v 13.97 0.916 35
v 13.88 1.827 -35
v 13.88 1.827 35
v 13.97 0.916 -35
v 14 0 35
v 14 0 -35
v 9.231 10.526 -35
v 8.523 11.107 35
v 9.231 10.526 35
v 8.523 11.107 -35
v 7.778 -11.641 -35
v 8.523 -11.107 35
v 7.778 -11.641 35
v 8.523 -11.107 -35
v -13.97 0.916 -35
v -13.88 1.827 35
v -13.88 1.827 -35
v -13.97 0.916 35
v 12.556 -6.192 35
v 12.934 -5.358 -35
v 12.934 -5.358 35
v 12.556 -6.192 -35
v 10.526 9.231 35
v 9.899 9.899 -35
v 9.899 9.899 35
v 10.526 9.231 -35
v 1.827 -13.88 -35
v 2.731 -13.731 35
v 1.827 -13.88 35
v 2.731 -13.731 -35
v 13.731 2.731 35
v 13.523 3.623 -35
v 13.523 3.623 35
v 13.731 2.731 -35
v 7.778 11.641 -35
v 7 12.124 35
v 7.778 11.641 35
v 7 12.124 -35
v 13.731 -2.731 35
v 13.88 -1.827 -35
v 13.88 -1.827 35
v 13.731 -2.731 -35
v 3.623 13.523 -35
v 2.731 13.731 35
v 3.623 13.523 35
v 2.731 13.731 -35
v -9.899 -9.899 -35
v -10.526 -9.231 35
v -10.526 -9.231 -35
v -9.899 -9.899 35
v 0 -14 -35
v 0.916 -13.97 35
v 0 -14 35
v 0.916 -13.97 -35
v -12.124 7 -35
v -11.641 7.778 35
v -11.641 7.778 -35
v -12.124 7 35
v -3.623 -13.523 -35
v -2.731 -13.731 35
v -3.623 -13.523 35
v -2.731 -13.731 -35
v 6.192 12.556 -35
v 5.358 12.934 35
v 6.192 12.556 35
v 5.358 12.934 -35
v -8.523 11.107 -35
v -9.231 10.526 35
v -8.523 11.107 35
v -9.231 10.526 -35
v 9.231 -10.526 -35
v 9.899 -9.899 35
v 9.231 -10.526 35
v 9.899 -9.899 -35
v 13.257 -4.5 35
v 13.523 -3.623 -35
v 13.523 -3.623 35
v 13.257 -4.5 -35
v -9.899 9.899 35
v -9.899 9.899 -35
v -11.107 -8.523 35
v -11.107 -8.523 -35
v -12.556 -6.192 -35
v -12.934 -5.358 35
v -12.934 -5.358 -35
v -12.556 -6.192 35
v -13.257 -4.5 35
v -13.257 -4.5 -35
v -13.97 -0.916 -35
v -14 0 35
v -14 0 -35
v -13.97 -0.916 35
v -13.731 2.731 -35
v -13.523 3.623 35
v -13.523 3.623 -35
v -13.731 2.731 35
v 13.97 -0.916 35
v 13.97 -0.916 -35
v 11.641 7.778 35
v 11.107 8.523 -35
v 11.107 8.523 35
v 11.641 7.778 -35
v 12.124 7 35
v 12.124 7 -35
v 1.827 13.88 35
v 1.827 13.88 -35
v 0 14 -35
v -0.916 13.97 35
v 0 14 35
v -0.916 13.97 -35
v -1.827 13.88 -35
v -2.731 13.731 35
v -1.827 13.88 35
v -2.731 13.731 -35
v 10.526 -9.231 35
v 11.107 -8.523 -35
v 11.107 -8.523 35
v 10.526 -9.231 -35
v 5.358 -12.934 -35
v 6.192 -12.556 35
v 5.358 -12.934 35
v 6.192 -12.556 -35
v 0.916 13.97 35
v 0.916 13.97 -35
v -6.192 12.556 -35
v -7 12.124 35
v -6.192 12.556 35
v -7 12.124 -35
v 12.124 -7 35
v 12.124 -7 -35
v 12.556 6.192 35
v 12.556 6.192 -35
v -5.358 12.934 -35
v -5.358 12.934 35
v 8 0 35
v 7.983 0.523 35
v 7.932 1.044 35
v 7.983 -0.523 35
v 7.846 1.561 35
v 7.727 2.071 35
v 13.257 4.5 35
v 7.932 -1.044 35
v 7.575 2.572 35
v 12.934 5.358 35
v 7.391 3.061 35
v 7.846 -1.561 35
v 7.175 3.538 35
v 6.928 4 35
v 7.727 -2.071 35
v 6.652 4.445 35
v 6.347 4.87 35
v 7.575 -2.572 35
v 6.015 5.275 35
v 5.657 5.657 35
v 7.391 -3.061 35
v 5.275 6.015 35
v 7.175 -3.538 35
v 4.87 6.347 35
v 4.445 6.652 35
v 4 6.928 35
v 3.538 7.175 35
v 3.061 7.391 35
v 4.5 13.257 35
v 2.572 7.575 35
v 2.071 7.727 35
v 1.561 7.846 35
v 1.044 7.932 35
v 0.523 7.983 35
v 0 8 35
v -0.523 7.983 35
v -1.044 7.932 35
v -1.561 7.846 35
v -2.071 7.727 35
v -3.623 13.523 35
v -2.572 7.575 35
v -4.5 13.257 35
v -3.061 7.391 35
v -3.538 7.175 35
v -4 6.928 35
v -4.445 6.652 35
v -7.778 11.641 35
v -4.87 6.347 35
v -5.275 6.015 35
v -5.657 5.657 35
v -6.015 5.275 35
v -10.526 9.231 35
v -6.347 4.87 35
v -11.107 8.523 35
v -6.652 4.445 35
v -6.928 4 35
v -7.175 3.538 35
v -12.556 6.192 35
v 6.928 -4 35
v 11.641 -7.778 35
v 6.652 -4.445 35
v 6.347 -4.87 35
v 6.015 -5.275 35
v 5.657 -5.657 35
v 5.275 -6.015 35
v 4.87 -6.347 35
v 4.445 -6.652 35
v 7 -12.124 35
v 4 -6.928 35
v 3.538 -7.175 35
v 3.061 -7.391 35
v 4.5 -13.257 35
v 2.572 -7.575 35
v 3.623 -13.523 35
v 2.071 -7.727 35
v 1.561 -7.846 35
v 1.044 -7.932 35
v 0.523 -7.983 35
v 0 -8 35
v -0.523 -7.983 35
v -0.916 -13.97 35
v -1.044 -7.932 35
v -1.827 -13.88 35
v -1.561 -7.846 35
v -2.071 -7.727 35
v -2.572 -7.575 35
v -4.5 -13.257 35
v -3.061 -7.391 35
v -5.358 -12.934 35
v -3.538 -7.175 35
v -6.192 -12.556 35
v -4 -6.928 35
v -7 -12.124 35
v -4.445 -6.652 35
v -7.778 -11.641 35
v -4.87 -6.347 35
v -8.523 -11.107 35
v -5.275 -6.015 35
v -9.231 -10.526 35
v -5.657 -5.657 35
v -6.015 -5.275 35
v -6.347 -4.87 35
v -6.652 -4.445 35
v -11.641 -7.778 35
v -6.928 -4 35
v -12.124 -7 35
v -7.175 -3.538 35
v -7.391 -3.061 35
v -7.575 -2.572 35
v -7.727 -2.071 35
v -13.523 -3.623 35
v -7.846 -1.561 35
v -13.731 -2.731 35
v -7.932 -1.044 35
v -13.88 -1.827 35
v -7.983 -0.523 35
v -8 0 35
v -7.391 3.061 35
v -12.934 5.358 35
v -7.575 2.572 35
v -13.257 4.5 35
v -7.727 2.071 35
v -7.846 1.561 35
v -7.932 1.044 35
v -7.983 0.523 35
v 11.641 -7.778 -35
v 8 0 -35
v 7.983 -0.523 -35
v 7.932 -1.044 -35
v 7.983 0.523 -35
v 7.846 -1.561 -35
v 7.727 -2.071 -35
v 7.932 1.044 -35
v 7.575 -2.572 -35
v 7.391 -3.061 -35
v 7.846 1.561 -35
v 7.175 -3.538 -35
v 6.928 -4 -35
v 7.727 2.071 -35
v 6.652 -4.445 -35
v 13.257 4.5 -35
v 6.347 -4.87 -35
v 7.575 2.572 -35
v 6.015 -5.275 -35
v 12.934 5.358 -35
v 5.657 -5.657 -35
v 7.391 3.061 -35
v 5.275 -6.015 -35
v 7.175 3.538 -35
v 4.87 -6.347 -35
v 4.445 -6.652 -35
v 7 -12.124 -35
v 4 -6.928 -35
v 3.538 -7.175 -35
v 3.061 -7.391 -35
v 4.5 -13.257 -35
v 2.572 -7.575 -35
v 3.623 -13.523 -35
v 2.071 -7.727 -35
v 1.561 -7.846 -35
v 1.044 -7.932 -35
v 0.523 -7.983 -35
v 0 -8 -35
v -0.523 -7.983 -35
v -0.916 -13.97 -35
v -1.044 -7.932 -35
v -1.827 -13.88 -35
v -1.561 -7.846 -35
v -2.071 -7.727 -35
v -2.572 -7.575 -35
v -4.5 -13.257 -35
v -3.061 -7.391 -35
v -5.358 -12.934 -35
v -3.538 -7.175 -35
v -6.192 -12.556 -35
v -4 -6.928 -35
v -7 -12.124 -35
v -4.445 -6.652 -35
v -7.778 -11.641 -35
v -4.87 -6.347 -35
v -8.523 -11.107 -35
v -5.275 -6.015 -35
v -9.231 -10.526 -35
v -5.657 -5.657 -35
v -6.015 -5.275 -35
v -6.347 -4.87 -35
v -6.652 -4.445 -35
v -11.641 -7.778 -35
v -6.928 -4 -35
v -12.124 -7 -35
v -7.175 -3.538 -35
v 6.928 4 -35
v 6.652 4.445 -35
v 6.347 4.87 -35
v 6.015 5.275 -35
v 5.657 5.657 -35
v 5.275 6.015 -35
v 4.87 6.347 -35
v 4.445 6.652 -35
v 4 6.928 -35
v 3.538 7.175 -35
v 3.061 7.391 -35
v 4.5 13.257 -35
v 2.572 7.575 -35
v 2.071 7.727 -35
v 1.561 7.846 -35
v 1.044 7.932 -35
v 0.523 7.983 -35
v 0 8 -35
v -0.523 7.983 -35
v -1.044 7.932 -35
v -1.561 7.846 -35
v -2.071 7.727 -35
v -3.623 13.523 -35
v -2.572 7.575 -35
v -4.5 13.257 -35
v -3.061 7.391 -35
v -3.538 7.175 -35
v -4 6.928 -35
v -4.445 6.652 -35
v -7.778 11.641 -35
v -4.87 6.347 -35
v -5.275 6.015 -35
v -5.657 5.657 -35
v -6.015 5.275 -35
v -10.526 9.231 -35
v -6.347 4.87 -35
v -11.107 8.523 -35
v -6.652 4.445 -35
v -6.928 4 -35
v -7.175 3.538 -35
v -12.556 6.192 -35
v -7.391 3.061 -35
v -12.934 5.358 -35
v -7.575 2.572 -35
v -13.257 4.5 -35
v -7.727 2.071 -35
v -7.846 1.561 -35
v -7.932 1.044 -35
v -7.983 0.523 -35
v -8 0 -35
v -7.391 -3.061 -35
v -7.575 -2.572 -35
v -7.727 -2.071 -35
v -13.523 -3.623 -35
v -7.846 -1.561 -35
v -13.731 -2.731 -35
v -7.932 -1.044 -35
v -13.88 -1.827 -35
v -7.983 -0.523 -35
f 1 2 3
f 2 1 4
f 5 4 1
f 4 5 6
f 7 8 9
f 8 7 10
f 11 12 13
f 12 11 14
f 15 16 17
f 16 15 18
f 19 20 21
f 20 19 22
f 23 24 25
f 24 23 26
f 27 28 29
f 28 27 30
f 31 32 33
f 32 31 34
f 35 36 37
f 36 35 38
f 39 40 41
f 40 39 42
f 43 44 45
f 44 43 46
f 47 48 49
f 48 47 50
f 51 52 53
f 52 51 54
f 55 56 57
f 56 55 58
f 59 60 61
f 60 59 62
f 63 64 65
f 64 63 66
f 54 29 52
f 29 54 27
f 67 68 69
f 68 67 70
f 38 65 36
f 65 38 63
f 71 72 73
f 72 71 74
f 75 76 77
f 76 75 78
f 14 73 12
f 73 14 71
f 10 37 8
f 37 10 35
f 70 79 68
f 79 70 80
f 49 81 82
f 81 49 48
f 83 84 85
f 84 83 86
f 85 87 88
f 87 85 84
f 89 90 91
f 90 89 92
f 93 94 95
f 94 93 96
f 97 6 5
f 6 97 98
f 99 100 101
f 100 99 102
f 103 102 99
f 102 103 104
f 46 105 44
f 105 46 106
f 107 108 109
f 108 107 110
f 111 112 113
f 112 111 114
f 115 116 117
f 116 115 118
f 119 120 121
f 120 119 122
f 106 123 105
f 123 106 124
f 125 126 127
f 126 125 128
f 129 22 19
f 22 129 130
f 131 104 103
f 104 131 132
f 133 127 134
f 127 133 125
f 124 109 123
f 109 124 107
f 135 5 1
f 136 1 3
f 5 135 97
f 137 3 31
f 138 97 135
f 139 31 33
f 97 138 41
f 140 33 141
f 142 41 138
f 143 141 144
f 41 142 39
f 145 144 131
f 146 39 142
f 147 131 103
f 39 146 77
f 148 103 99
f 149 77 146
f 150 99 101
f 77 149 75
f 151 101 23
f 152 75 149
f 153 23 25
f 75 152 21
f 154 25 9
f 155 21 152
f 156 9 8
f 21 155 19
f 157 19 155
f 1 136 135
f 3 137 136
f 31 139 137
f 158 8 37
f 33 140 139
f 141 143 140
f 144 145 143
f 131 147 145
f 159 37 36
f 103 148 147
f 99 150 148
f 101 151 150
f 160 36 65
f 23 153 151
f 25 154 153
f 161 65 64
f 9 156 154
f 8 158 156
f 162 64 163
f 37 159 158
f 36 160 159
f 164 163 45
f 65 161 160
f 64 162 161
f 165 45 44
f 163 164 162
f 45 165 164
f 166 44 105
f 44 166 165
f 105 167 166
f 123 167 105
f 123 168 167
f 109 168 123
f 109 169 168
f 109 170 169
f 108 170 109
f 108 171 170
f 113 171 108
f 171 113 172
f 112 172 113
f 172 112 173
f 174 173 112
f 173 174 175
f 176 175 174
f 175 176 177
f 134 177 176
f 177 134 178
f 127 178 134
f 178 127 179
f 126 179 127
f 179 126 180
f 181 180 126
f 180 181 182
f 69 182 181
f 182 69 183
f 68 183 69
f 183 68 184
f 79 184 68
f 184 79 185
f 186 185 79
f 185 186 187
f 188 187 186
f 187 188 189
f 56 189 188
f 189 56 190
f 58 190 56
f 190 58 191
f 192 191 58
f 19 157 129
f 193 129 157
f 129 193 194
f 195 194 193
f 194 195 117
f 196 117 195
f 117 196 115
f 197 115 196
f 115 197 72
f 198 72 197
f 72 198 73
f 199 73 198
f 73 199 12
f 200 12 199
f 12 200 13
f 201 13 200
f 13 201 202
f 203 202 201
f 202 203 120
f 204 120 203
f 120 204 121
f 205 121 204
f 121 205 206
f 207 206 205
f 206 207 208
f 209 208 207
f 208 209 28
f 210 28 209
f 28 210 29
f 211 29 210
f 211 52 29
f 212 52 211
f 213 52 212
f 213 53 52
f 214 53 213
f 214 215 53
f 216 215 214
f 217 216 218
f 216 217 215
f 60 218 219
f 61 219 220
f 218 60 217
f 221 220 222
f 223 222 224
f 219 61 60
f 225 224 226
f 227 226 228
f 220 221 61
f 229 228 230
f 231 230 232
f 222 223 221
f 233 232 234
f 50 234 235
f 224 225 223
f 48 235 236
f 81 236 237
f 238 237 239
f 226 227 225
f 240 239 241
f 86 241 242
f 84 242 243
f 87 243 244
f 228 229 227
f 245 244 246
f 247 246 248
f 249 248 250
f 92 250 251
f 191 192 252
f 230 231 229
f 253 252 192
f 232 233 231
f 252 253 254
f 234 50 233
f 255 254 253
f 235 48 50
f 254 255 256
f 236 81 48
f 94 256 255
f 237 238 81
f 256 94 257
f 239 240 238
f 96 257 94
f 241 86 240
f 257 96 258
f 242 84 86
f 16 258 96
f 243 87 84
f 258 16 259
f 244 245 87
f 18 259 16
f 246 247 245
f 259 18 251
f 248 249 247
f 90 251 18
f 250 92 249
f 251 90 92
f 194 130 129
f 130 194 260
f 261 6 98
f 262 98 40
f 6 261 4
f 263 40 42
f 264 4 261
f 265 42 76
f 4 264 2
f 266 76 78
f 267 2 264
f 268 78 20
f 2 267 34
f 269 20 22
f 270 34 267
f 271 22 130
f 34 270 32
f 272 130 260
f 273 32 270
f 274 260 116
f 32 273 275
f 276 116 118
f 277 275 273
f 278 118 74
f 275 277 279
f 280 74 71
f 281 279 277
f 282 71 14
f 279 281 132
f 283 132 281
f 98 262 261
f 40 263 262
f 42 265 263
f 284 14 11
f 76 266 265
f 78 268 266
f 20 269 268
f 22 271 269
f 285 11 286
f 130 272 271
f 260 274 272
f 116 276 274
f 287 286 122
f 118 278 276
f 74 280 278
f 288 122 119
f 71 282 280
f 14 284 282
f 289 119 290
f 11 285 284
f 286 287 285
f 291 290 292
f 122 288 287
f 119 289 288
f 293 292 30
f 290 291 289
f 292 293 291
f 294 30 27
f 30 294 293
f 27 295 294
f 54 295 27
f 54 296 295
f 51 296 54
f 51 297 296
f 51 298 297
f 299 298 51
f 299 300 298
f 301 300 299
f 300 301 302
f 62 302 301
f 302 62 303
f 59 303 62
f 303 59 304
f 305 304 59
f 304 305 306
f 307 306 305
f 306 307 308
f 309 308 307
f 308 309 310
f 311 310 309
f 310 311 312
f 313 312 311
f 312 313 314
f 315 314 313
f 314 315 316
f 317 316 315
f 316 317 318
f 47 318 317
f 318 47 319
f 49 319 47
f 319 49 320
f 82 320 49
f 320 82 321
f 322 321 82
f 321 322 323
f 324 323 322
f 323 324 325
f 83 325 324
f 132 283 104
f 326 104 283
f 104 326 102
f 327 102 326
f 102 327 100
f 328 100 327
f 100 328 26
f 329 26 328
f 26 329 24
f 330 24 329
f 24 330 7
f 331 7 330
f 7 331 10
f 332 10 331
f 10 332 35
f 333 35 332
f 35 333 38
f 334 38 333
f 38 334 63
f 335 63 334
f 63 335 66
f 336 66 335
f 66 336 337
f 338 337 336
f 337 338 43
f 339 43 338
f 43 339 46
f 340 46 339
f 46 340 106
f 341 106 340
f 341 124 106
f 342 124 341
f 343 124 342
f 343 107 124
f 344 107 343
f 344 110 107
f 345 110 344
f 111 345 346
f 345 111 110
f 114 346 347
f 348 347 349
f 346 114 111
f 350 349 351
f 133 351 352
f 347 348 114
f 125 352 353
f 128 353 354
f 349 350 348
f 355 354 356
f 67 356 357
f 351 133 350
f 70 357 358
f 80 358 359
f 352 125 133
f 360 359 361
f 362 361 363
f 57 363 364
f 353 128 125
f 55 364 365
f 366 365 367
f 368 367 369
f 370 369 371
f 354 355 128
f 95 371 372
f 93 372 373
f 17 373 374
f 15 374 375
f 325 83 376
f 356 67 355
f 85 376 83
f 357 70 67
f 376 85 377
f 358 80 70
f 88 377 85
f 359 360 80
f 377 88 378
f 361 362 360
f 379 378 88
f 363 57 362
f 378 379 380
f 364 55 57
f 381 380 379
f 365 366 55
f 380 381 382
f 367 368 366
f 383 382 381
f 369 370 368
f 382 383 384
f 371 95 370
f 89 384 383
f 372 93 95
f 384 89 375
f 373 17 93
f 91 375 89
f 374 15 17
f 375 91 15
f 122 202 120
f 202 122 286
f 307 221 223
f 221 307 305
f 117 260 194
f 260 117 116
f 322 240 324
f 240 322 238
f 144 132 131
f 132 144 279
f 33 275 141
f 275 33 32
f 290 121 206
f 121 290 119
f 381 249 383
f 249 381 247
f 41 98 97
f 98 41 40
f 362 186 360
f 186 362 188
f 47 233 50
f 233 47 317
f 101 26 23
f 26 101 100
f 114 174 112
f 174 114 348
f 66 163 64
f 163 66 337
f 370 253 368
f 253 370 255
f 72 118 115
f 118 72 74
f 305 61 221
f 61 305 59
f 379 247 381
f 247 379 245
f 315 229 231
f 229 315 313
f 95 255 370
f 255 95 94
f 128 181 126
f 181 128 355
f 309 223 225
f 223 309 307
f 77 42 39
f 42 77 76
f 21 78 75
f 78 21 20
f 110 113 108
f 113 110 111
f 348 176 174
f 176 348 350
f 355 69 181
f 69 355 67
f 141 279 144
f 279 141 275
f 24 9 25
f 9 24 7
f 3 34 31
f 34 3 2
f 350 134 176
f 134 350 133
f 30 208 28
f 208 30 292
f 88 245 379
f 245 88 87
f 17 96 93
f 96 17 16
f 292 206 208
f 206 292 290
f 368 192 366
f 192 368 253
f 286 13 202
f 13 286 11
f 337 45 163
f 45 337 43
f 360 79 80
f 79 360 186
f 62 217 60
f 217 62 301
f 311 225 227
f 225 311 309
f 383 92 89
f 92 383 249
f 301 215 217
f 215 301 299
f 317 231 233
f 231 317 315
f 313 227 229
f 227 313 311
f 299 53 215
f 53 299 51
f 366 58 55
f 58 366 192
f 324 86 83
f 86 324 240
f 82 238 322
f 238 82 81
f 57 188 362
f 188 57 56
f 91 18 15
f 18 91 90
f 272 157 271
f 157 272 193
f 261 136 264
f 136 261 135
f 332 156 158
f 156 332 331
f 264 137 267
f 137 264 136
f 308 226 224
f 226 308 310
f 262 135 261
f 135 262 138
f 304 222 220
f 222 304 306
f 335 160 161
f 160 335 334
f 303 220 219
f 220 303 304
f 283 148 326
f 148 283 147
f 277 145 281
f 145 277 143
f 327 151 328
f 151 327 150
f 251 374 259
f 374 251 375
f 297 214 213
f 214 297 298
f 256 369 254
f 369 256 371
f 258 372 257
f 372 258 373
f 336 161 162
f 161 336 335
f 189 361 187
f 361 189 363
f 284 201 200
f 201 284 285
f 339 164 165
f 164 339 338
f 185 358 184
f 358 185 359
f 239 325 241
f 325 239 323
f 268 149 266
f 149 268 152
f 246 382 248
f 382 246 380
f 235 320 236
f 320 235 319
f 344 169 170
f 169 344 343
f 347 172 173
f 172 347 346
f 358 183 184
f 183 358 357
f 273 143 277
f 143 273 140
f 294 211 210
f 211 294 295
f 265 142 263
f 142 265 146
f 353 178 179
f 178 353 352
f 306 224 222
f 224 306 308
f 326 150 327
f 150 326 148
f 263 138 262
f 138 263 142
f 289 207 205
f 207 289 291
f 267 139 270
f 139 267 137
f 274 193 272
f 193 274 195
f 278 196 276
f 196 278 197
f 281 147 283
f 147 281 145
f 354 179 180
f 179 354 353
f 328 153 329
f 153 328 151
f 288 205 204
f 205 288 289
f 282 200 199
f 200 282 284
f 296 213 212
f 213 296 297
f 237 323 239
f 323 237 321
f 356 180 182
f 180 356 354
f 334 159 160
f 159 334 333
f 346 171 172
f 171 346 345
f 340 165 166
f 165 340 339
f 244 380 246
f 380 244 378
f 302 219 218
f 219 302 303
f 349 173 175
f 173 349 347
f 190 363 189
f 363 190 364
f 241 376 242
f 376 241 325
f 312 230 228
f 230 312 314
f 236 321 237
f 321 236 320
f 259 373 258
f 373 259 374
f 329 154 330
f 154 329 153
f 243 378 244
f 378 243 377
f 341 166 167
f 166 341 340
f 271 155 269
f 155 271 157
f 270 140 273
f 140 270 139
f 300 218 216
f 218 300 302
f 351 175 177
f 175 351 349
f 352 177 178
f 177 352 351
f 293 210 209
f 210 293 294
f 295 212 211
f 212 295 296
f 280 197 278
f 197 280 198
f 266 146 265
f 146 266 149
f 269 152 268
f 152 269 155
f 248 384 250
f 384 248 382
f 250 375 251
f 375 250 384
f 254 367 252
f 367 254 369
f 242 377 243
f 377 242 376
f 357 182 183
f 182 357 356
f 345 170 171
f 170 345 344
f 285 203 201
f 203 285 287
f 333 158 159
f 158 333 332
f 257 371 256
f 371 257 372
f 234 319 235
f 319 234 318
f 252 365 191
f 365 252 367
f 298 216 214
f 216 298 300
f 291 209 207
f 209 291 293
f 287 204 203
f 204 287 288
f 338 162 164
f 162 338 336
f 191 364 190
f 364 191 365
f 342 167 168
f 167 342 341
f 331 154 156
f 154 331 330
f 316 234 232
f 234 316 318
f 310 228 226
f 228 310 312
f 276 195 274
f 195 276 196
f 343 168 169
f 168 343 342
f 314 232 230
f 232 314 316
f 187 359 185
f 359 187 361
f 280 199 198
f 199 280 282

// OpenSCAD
// Long Linear Bearing (single connected solid)
// Target: 16.0mm bore, 28.0mm outer diameter, 70.0mm length

bore_diameter_mm  = 16.0;  //[8.0:32.0:0.5]
outer_diameter_mm = 28.0;  //[14.0:56.0:0.5]
length_mm         = 70.0;  //[35.0:140.0:1]
centered          = 1;     //[0:1:1]
eps_mm            = 0.6;   //[0.2:2.0:0.1]
$fn = 96;

module long_linear_bearing() {
    bore_r  = bore_diameter_mm/2;
    outer_r = outer_diameter_mm/2;

    // Centering control (no arbitrary translations)
    z0 = (centered == 1) ? 0 : length_mm/2;

    // One connected solid: outer cylinder minus inner bore
    difference() {
        translate([0,0,z0])
            cylinder(r=outer_r, h=length_mm, center=(centered==1));
        translate([0,0,z0])
            cylinder(r=bore_r, h=length_mm + 2*eps_mm, center=(centered==1));
    }
}

long_linear_bearing();
